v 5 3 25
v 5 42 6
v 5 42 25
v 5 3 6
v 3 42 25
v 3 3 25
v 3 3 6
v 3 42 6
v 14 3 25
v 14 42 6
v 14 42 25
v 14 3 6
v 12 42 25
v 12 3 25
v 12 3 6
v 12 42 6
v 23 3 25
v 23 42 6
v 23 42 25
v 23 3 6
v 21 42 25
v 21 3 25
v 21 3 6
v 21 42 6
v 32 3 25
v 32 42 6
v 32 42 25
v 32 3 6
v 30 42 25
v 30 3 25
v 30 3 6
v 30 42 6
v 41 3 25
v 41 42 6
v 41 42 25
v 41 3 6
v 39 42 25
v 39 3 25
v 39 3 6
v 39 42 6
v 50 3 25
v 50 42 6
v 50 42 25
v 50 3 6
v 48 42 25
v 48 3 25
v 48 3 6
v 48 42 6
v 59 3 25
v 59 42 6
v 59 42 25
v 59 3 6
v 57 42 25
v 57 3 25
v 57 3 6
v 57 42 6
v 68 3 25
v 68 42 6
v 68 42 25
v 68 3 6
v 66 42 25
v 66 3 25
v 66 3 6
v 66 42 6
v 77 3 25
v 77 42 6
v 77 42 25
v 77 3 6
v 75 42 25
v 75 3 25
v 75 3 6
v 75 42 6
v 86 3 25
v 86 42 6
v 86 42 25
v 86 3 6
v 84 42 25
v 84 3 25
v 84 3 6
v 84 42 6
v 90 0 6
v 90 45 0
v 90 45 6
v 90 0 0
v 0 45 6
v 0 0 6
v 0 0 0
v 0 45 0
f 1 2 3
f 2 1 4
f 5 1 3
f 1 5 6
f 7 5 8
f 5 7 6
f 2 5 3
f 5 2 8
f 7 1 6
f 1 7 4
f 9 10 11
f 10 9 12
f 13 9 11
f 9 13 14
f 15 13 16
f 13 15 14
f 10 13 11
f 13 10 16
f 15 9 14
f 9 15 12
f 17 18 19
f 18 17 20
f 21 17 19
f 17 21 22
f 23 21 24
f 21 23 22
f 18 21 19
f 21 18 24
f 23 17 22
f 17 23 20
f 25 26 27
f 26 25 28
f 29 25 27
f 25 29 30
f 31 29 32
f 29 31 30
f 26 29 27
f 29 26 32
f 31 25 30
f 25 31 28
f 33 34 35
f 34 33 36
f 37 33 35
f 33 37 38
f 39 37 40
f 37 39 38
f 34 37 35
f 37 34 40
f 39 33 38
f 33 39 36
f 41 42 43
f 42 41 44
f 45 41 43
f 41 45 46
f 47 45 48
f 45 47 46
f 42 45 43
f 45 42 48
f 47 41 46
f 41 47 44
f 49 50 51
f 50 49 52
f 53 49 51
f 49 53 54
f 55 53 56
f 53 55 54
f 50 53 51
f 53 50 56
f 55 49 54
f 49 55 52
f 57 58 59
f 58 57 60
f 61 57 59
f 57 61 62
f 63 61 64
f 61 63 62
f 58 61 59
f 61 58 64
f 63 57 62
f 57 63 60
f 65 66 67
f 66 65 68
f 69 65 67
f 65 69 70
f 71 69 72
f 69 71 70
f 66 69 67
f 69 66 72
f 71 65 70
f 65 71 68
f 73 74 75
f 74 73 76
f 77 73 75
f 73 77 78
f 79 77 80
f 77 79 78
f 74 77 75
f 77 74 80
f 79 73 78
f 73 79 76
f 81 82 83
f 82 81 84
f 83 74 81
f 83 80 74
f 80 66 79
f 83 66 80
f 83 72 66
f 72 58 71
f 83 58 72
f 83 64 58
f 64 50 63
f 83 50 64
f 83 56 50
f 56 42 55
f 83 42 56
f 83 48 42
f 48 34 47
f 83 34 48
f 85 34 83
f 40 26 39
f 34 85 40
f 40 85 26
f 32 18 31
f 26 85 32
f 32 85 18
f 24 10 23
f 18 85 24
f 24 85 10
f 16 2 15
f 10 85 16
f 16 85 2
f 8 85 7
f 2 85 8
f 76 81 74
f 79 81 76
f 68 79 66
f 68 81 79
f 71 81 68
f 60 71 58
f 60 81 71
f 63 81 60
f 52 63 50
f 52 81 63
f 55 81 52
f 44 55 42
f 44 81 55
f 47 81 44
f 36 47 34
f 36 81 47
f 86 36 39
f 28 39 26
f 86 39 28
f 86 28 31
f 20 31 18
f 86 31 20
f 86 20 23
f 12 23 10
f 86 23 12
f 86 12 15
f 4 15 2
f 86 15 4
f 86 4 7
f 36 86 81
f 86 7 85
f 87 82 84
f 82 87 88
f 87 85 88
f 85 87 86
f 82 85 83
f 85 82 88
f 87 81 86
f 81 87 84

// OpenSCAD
$fn = 32;

// ----------------------------------------------------------------------
// Heatsink: uniform fin block
// ----------------------------------------------------------------------

// --- parameters (mm) ---
base_l = 90;              // base length, X
base_w = 45;              // base width, Y
base_t = 6;               // base plate thickness
fin_h = 20;               // fin height above the base
fin_t = 2;                // fin thickness
edge = 3;                 // margin from the base ends
pitch = 9;                // fin pitch

n_fins = floor((base_l - 2 * edge - fin_t) / pitch) + 1;  // fin count
total_h = base_t + fin_h - 1;  // overall height

union() {
  cube([base_l, base_w, base_t]);
  for (i = [0 : n_fins - 1])
    translate([edge + i * pitch, edge, base_t - 1])
      cube([fin_t, base_w - 2 * edge, fin_h]);
}
